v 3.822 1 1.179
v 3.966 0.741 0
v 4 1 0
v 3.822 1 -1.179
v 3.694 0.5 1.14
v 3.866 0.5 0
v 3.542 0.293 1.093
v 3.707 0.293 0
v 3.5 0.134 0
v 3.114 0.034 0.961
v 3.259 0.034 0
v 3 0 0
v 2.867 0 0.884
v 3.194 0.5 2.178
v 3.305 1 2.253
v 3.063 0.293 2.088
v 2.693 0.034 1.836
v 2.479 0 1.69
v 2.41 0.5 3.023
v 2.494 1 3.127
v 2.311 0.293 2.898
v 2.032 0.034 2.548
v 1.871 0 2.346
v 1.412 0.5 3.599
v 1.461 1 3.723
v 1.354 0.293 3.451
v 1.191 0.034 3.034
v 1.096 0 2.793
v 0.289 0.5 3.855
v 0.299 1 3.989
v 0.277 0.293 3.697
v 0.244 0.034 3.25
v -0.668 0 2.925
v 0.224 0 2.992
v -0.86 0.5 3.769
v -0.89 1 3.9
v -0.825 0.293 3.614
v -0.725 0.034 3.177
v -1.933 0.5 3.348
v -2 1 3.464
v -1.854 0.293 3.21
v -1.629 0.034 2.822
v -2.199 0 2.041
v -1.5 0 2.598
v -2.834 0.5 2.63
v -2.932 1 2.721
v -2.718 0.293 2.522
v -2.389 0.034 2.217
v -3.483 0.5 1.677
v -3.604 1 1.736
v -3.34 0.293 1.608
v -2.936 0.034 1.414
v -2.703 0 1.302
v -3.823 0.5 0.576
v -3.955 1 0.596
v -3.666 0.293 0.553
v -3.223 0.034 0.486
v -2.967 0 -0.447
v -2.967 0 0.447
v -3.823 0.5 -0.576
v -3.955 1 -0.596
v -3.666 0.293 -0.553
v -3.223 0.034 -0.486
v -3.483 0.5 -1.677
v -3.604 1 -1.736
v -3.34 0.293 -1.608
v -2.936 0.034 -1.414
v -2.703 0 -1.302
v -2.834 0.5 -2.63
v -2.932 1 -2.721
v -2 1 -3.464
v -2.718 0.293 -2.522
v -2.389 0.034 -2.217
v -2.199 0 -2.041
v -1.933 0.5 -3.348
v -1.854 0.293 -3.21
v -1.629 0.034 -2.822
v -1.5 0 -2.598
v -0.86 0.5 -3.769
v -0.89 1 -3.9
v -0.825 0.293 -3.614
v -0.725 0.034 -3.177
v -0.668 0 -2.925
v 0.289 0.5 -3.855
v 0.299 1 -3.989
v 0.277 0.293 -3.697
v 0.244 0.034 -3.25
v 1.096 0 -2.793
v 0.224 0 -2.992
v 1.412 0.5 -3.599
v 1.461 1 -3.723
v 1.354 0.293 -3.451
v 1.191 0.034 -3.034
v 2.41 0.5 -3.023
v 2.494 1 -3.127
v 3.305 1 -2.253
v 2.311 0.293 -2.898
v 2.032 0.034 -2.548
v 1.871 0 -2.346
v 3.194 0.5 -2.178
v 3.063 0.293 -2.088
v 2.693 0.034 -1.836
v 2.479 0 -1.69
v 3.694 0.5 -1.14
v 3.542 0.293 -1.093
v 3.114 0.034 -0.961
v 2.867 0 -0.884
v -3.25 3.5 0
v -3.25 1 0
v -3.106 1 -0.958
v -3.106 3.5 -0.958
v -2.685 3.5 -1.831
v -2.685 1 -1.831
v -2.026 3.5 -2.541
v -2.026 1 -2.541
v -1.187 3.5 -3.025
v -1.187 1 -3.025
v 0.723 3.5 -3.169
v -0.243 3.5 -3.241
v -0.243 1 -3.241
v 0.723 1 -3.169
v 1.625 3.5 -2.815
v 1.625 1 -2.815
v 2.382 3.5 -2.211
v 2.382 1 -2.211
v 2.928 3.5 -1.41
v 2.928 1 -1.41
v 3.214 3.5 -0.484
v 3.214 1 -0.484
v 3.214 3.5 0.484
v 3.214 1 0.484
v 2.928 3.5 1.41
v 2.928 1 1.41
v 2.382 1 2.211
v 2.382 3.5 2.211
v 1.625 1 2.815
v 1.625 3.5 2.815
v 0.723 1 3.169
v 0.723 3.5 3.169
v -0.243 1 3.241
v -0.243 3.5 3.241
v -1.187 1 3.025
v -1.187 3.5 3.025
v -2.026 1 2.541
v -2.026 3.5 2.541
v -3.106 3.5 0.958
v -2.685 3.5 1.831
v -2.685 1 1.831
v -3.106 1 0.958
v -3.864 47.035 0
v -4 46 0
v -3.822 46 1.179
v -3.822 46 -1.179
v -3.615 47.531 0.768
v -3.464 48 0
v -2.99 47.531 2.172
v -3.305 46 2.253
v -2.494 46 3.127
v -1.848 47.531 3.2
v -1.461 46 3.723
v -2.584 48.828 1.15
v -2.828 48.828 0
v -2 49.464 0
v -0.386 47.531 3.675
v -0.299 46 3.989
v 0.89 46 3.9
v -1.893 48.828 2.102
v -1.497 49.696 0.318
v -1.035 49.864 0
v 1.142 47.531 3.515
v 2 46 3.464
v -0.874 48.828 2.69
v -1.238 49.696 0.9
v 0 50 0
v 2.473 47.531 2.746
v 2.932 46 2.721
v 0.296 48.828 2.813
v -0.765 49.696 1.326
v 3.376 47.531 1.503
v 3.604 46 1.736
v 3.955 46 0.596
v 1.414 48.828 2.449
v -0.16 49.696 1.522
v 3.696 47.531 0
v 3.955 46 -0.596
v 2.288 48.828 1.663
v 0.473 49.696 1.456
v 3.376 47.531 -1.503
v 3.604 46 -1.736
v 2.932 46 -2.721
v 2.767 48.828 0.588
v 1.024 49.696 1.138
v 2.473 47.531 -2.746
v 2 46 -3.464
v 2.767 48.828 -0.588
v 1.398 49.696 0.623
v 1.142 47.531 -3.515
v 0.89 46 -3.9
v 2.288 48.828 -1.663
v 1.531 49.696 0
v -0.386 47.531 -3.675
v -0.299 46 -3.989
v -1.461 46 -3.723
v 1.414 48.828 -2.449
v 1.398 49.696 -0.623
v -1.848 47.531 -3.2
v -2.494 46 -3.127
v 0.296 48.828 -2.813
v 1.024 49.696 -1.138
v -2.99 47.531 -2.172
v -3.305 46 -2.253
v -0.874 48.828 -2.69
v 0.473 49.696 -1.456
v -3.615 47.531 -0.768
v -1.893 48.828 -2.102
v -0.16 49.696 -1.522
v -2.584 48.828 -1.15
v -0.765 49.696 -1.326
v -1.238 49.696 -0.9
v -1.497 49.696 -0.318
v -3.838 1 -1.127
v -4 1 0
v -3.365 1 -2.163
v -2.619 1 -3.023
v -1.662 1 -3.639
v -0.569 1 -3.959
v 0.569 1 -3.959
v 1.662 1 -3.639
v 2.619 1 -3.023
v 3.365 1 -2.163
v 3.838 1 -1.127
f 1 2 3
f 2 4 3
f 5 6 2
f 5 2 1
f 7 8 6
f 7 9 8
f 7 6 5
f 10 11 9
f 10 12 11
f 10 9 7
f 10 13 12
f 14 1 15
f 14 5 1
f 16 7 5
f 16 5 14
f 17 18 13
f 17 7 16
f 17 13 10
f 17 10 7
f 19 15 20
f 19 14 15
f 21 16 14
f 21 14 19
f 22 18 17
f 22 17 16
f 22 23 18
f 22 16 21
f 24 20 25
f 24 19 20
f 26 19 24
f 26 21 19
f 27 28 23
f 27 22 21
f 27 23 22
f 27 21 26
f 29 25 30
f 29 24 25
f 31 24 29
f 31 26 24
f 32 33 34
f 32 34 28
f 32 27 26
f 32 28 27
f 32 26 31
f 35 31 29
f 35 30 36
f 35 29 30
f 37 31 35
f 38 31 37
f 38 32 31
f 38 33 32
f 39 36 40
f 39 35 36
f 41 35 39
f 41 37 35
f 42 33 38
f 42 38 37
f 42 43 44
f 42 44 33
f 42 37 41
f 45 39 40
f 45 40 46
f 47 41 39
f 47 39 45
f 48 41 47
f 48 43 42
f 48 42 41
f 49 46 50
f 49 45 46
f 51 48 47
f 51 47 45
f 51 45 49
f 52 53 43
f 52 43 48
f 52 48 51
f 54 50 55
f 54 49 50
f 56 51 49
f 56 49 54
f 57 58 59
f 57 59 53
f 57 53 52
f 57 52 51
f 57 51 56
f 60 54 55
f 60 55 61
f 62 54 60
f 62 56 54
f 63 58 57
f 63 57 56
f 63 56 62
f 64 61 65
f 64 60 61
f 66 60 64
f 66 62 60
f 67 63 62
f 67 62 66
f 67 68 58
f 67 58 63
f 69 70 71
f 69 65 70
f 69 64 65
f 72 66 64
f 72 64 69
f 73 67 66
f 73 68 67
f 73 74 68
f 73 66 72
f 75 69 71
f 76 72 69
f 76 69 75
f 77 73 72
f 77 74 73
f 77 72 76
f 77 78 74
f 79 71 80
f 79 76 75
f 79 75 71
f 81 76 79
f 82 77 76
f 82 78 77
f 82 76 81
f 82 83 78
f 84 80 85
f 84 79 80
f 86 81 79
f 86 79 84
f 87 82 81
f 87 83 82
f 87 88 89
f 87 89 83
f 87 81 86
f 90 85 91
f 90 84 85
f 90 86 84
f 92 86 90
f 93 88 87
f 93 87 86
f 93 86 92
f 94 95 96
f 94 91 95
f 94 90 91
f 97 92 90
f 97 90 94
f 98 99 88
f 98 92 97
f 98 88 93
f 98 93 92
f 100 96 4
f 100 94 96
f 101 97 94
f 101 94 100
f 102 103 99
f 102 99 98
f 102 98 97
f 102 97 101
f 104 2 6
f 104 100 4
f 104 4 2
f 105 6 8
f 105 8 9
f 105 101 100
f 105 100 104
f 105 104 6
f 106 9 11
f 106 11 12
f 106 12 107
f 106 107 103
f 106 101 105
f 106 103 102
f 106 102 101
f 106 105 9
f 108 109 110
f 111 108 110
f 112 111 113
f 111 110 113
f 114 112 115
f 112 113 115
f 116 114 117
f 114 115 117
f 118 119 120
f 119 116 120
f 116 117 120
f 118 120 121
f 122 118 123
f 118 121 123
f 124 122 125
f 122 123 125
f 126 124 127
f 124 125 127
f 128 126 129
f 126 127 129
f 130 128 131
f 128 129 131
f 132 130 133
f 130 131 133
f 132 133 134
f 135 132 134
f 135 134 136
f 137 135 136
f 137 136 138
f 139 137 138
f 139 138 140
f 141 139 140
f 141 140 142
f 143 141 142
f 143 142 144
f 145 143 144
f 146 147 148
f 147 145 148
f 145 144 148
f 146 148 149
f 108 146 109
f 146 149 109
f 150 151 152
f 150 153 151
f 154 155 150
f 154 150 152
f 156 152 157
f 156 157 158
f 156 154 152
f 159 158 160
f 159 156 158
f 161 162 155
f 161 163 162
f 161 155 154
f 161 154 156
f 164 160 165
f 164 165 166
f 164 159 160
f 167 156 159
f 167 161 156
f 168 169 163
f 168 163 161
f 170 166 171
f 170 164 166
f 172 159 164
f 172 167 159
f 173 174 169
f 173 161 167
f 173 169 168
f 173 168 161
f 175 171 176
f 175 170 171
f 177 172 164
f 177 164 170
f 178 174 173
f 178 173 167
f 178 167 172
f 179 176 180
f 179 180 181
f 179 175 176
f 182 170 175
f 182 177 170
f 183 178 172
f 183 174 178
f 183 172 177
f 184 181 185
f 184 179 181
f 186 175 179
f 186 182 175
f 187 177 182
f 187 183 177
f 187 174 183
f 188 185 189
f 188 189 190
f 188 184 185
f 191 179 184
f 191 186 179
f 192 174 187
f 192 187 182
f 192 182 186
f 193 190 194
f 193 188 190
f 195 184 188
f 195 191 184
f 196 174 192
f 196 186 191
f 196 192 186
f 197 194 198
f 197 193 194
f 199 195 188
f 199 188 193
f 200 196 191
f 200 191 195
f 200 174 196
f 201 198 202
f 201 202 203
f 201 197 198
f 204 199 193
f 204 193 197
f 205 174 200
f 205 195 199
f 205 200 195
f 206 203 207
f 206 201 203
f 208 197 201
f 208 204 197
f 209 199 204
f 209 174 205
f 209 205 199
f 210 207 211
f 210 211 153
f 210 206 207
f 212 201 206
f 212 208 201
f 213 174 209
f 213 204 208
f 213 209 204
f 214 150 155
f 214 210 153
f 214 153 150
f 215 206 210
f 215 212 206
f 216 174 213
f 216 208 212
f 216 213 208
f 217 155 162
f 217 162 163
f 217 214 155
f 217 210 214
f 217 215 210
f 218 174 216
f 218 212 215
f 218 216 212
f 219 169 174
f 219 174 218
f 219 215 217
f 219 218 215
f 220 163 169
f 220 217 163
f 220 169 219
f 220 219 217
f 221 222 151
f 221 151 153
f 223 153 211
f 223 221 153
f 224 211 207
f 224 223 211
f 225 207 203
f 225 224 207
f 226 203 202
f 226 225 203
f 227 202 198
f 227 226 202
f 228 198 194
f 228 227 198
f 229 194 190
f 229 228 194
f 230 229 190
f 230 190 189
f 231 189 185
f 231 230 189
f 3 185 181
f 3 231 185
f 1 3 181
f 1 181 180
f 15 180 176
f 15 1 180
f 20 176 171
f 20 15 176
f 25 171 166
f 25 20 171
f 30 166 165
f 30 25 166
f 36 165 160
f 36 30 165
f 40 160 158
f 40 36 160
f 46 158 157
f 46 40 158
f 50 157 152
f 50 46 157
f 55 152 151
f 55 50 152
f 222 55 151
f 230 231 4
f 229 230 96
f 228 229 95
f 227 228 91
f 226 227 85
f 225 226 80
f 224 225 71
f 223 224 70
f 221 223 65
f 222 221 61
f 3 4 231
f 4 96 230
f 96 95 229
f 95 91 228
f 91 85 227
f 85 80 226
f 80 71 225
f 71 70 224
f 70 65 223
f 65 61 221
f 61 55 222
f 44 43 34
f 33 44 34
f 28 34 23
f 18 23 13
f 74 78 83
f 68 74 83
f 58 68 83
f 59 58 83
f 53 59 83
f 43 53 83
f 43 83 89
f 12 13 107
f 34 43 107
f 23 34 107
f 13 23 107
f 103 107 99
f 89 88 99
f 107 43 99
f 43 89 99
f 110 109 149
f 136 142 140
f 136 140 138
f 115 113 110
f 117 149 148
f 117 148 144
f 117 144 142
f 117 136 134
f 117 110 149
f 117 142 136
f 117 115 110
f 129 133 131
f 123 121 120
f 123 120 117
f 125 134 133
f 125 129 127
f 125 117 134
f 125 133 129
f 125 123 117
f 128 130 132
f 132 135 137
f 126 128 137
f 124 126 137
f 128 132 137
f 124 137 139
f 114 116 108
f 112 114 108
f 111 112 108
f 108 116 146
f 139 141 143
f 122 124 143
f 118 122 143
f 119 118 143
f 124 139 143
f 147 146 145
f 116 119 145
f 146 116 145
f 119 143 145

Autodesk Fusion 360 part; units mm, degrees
sketch "Base - Top" plane through (0, 0, 0) normal (0, 1, 0) x (1, 0, 0)
  circle A0 centre (0, 0) radius 4
  dimension "d6" = 8
extrude "Extrude1" add sketch "Base - Top" along normal blind 1
sketch "Cavity - Top" plane through (0, 1, 0) normal (0, 1, 0) x (-1, 0, 0)
  circle A0 centre (0, 0) radius 4
  circle A1 centre (0, 0) radius 3.25
  dimension "d9" = 6.5
extrude "Extrude2" add sketch "Cavity - Top" along normal blind 2.5
sketch "Handle - Top" plane through (0, 3.5, 0) normal (0, 1, 0) x (-1, 0, 0)
  circle A0 centre (0, 0) radius 3.25
  circle A1 centre (0, 0) radius 4
  circle A2 centre (0, 0) radius 4
  dimension "d12" = 8
extrude "Extrude3" add sketch "Handle - Top" along normal blind 46.5 contours A0 | A1 A2
fillet "Fillet1" radius 4 1 edges at (3.7293, 50, -1.4465)
fillet "Fillet2" radius 1 1 edges at (-3.7293, 0, 1.4465)
equation "full_length = 50 mm" comment "Full length of the applicator."
equation "full_width = 8 mm" comment "Full width of the applicator."
equation "cavity_depth = 1 mm" comment "Depth at which the magnet cavity begins."
equation "cavity_height = magnet_height + cavity_accuracy" comment "The height of the cavity."
equation "cavity_width = magnet_width + cavity_accuracy" comment "The width of the cavity."
equation "d6 = full_width"
equation "d7 = cavity_depth"
equation "d9 = cavity_width"
equation "d10 = cavity_height"
equation "d12 = full_width"
equation "d13 = handle_length"
equation "handle_length = full_length - cavity_height - cavity_depth" comment "Length from top of handle to top of cavity."
equation "magnet_height = 2 mm" comment "Height of the magnet."
equation "magnet_width = 6 mm" comment "Width of the magnet."
equation "cavity_accuracy = 0.5 mm" comment "How much extra space to give the magnet cavity."
equation "handle_fillet = full_width / 2" comment "Amount to fillet the top of the handle."
equation "d21 = handle_fillet"
equation "tip_fillet = 1 mm" comment "Amount to fillet the magnet-end of the applicator."
equation "d24 = tip_fillet"
